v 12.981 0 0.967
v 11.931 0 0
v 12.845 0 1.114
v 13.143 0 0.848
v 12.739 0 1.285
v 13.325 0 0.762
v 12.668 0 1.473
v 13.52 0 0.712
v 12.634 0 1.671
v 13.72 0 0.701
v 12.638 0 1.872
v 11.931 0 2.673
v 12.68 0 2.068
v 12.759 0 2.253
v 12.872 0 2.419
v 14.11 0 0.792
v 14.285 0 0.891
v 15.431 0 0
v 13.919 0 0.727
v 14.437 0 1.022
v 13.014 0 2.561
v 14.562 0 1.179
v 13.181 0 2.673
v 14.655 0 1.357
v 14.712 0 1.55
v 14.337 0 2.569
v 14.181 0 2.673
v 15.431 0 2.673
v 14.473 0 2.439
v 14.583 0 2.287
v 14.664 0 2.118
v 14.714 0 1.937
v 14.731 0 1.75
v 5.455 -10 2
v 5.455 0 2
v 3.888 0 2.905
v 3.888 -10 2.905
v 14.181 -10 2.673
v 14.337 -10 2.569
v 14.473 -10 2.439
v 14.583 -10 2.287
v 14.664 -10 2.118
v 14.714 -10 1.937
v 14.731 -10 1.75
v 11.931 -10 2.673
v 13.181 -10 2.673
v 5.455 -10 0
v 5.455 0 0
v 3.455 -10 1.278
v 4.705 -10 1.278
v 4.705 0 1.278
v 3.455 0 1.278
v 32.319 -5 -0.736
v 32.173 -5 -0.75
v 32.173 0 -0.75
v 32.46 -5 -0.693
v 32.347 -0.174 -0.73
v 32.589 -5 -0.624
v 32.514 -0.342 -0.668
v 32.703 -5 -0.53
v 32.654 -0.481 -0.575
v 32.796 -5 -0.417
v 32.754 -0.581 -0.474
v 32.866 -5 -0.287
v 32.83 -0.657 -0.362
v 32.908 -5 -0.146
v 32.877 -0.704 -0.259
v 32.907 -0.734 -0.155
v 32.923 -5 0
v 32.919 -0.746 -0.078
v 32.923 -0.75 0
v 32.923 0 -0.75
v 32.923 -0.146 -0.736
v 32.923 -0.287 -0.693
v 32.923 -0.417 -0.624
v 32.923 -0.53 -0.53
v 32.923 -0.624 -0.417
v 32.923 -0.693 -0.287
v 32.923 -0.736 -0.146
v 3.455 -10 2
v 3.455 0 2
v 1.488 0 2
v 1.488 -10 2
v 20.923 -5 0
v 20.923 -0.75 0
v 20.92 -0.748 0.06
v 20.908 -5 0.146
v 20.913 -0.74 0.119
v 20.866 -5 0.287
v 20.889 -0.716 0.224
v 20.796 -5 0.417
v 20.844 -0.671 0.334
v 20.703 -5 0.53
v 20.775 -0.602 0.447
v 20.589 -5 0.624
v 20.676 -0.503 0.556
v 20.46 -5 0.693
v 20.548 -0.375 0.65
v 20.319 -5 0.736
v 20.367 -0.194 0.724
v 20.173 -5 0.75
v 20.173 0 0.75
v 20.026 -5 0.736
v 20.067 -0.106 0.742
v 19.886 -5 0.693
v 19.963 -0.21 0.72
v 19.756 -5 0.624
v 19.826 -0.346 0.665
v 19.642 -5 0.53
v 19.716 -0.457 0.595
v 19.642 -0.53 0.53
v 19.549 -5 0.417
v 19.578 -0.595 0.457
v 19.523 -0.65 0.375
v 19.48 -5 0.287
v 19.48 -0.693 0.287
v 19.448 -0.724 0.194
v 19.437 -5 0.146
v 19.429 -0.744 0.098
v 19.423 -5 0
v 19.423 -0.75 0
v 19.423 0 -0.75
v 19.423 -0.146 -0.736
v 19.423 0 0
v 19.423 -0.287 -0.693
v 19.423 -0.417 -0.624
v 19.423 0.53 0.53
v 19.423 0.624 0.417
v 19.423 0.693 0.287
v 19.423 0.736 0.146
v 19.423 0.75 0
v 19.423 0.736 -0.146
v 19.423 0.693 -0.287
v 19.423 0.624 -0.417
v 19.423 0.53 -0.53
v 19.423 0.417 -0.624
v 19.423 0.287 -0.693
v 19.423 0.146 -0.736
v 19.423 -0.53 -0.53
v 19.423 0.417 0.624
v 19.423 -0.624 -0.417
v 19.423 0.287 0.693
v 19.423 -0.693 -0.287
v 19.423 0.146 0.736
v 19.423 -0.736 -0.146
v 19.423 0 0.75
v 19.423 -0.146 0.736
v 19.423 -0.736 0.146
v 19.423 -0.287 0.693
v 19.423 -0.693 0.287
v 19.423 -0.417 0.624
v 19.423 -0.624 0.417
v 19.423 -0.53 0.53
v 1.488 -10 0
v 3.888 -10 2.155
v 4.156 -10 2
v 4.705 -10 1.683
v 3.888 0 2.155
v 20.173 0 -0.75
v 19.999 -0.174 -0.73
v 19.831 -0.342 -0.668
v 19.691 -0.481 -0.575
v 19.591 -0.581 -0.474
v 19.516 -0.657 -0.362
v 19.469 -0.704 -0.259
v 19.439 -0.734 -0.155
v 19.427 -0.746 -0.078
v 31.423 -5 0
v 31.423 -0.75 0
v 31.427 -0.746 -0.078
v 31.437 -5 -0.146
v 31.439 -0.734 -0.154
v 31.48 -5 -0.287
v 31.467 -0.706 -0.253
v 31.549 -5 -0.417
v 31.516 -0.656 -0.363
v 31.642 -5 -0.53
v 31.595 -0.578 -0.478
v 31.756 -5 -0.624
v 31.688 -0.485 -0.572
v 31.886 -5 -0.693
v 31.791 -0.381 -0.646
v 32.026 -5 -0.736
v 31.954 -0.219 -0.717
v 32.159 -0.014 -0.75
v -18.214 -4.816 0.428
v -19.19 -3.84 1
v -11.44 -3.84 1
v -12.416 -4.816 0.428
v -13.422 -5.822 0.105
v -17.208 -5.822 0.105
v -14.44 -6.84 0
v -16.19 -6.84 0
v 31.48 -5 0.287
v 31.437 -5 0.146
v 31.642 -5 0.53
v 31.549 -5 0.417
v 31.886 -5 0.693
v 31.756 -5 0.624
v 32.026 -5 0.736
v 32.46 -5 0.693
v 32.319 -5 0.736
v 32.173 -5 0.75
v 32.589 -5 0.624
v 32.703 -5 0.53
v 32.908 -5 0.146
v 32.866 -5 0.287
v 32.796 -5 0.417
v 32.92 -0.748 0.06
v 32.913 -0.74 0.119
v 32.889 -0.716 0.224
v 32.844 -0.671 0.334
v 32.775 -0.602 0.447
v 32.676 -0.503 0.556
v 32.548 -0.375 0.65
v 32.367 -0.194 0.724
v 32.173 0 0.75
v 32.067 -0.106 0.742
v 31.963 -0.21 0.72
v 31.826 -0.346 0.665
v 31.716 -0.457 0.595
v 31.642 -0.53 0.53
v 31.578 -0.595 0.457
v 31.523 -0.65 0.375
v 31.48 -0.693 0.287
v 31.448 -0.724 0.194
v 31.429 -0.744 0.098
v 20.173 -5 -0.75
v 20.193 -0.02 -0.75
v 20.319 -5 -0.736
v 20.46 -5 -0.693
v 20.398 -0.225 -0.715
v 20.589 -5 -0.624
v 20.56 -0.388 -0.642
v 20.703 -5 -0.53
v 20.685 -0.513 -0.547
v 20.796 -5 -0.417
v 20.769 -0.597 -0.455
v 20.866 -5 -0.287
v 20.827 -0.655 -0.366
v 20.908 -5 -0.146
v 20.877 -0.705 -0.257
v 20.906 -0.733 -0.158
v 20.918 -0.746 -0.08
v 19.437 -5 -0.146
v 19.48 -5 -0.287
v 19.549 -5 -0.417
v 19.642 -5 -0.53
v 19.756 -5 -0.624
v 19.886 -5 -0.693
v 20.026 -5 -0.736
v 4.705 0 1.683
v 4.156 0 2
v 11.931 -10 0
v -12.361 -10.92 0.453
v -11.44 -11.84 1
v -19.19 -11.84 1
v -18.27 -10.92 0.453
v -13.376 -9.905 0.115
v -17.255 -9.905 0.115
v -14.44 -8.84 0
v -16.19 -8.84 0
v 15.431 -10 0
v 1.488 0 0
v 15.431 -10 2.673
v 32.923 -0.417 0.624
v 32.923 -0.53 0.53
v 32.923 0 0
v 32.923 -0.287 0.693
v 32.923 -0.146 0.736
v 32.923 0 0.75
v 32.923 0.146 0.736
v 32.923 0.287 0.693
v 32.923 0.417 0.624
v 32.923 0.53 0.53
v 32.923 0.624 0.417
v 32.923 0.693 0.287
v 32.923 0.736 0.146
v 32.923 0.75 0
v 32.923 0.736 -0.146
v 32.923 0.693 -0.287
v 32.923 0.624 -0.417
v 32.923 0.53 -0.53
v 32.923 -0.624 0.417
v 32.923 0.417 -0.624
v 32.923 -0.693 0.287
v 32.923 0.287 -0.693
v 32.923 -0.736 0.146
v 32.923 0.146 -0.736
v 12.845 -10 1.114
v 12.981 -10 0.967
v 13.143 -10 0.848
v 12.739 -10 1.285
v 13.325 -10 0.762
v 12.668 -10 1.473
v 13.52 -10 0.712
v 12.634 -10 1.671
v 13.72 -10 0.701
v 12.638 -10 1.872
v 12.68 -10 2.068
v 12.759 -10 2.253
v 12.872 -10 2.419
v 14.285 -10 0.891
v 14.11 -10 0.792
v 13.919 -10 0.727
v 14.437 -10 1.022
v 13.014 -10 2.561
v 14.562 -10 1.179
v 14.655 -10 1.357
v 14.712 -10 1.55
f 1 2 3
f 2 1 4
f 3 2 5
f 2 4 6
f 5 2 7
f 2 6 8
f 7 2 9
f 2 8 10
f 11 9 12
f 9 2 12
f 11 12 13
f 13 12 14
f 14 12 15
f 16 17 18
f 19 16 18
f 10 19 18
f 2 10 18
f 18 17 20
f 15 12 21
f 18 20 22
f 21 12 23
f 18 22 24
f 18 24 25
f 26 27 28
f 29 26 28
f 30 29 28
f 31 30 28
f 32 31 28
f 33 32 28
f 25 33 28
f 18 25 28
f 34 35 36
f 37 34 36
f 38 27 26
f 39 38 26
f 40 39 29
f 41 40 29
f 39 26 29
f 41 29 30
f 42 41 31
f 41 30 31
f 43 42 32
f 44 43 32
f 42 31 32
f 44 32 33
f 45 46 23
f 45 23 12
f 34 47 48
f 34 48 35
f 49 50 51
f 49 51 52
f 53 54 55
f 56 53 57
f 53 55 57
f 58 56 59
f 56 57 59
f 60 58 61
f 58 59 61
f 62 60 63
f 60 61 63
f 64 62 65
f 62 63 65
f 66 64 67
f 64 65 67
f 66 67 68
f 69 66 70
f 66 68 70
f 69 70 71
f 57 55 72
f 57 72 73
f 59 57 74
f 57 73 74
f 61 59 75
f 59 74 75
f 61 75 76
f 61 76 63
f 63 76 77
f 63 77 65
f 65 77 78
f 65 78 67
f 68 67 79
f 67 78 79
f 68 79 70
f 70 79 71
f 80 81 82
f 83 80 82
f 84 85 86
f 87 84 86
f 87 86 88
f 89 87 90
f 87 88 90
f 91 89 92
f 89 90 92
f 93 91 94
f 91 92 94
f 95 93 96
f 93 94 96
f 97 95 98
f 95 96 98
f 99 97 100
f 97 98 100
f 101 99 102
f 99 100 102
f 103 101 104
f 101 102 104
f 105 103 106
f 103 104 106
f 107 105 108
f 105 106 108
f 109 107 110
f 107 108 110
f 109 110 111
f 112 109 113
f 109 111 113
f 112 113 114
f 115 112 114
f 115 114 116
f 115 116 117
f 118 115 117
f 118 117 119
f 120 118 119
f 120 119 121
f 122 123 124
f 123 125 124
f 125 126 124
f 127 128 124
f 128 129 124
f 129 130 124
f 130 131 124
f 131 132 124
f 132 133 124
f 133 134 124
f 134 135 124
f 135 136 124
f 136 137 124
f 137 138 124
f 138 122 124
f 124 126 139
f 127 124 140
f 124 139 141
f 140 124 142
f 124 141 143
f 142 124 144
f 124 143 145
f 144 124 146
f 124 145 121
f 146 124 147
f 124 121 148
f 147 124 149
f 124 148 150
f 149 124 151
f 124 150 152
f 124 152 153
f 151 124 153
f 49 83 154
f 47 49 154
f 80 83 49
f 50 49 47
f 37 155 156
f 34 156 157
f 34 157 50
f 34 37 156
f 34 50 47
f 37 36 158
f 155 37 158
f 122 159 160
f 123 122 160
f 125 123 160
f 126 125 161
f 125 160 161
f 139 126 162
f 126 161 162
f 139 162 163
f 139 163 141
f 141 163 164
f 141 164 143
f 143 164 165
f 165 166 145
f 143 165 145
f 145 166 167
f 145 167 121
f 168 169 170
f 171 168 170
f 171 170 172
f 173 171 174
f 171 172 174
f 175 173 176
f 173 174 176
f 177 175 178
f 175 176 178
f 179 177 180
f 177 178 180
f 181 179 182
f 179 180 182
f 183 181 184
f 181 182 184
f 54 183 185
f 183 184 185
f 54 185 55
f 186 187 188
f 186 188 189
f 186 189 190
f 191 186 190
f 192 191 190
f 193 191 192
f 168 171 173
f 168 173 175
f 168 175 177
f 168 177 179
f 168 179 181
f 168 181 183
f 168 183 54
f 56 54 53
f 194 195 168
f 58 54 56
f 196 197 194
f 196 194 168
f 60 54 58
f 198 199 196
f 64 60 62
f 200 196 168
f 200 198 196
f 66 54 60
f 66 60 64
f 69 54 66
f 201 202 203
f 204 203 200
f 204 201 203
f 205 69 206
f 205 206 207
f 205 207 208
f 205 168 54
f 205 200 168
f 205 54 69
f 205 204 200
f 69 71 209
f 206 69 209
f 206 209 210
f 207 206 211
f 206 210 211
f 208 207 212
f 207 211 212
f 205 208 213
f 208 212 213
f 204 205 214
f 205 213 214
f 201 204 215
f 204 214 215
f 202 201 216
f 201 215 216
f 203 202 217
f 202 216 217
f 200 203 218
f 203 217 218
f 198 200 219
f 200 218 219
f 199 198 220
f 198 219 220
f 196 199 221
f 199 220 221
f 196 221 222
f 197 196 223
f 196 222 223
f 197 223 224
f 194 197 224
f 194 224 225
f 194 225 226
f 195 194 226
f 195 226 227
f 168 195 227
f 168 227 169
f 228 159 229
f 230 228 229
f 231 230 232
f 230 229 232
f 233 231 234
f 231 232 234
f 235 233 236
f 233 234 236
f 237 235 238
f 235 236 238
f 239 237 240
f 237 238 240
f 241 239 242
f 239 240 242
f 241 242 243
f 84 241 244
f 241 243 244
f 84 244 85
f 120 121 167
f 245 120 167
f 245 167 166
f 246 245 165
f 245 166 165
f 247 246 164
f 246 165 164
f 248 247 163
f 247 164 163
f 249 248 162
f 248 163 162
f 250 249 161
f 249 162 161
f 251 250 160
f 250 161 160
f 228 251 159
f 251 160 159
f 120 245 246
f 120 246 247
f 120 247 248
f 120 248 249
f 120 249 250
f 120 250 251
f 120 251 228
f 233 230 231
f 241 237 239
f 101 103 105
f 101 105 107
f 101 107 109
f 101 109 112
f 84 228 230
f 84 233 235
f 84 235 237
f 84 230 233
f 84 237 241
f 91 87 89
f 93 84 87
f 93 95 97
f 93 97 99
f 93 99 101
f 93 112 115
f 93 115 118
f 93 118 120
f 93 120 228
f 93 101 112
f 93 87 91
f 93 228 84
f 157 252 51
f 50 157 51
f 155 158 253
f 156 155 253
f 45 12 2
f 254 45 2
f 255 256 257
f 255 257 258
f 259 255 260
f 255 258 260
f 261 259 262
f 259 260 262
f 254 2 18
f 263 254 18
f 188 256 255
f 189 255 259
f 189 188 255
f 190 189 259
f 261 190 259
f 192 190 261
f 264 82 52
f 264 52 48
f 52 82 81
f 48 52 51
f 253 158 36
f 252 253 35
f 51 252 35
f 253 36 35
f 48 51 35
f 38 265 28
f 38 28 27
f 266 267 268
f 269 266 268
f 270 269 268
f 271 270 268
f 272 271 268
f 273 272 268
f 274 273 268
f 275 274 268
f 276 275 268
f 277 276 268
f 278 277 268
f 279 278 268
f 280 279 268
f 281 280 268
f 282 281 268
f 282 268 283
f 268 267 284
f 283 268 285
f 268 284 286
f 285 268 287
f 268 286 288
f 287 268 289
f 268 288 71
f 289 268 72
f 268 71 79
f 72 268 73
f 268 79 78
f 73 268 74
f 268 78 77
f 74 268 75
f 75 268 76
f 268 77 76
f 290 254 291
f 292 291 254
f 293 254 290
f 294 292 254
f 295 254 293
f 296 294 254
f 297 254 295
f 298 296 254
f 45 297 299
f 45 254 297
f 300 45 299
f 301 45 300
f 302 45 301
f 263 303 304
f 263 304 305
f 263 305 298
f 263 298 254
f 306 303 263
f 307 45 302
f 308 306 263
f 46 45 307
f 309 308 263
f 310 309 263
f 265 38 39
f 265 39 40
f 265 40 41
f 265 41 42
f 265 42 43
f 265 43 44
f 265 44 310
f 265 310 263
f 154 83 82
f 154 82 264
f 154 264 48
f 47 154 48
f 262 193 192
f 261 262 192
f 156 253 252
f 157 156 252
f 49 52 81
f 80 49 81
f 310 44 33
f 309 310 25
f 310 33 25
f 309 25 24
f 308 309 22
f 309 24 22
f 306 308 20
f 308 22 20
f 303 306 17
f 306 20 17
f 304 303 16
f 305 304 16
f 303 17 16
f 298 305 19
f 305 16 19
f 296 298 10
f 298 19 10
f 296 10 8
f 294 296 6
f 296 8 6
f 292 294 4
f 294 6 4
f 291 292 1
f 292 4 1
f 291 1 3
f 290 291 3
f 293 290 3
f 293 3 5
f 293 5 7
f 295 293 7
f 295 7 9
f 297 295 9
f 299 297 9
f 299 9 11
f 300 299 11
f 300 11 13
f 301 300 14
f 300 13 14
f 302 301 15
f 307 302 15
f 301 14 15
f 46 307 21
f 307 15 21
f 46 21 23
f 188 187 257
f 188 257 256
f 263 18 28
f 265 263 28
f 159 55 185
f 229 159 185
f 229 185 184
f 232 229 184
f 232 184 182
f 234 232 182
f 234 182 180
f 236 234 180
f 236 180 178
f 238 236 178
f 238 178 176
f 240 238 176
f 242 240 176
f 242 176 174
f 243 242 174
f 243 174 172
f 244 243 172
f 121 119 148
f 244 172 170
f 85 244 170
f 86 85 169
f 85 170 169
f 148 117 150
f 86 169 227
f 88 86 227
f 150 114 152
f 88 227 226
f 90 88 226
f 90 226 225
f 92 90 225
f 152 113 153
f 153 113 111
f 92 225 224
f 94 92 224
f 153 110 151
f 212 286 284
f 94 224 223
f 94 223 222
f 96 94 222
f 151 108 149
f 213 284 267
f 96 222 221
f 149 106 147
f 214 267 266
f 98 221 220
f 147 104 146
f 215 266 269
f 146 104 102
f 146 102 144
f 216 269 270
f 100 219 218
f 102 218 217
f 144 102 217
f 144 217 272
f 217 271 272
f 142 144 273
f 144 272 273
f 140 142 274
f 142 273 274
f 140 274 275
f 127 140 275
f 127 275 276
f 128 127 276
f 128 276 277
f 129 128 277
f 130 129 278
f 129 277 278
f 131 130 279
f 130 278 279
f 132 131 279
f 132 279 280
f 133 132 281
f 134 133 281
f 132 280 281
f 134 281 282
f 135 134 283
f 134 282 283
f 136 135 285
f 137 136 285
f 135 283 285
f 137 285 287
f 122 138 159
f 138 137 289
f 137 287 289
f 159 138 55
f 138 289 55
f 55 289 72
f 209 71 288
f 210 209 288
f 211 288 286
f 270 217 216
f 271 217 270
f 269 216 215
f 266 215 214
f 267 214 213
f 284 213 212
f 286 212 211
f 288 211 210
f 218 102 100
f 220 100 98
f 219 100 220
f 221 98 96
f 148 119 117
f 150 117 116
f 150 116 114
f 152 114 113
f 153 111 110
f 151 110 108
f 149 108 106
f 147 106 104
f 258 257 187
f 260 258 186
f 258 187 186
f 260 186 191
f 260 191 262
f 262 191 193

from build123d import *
from build123d import SkipClean  # not in build123d's __all__

# Parameters (mm, degrees)
F1_DEPTH    = 10
F2_W        = 7.7500019912
F2_H        = 8
F3_DEPTH    = 1
F4_T1_DEPTH = 22.7500019912
F4_T3_DEPTH = 23
F6_DEPTH    = 10
F8_DEPTH    = 5


# Not quite as in the source:
# - a fillet or chamfer that OpenCascade refuses, or shapes differently, is made with other operations: its cross-section is extruded or revolved along the edge and cut away or added


with BuildPart() as f1:
    # F0 (on Front) → F1 (new body)
    with BuildSketch(Plane.XZ):
        Polygon((3.4554570526, 2), (1.4884697545, 2), (1.4884697545, 0), (5.4554570526, 0), (5.4554570526, 2), (3.8884697545, 2.9047005384), (3.8884697545, 2.1547005384), (4.1564189469, 2), (4.7054570526, 1.6830127019), (4.7054570526, 1.2783121635), (3.8884697545, 1.2783121635), (3.4554570526, 1.2783121635), align=None)
    extrude(amount=F1_DEPTH)


with BuildPart() as f3:
    # F2 (on Top) → F3 (new body)
    with BuildSketch(Plane.XY):
        with Locations((-15.3153333813, -7.8402892686)):
            Rectangle(F2_W, F2_H)
    extrude(amount=F3_DEPTH)

    # F4: fillet of radius 5 on 4 edges, made by hand

    # F4_s2 → F4_t1 (cut)
    with BuildSketch(Plane.YZ.offset(-26.6903343769)):
        with BuildLine():
            ThreePointArc((-3.8402892686, 1), (-5.2591504386, 0.2565835097), (-6.8402892686, 0))
            Line((-6.8402892686, 0), (-6.8402892686, -0.1))
            Line((-6.8402892686, -0.1), (-3.8402892686, -0.1))
            Line((-3.8402892686, -0.1), (-3.7402892686, 0))
            ThreePointArc((-3.7402892686, 0), (-3.7402892686, 0.5), (-3.7802892686, 0.92))
            Line((-3.7802892686, 0.92), (-3.8402892686, 1))
        make_face()
        with BuildLine():
            ThreePointArc((-11.8402892686, 1), (-10.4214280987, 0.2565835097), (-8.8402892686, 0))
            Line((-8.8402892686, 0), (-8.8402892686, -0.1))
            Line((-8.8402892686, -0.1), (-11.8402892686, -0.1))
            Line((-11.8402892686, -0.1), (-11.9402892686, 0))
            ThreePointArc((-11.9402892686, 0), (-11.9402892686, 0.5), (-11.9002892686, 0.92))
            Line((-11.9002892686, 0.92), (-11.8402892686, 1))
        make_face()
    extrude(amount=F4_T1_DEPTH, mode=Mode.SUBTRACT)

    # F4_s4 → F4_t3 (cut)
    with BuildSketch(Plane.XZ.offset(-3.6597107314)):
        with BuildLine():
            ThreePointArc((-19.1903343769, 1), (-17.771473207, 0.2565835097), (-16.1903343769, 0))
            Line((-16.1903343769, 0), (-16.1903343769, -0.1))
            Line((-16.1903343769, -0.1), (-19.1903343769, -0.1))
            Line((-19.1903343769, -0.1), (-19.2903343769, 0))
            ThreePointArc((-19.2903343769, 0), (-19.2903343769, 0.5), (-19.2503343769, 0.92))
            Line((-19.2503343769, 0.92), (-19.1903343769, 1))
        make_face()
        with BuildLine():
            ThreePointArc((-11.4403323857, 1), (-12.8591935556, 0.2565835097), (-14.4403323857, 0))
            Line((-14.4403323857, 0), (-14.4403323857, -0.1))
            Line((-14.4403323857, -0.1), (-11.4403323857, -0.1))
            Line((-11.4403323857, -0.1), (-11.3403323857, 0))
            ThreePointArc((-11.3403323857, 0), (-11.3403323857, 0.5), (-11.3803323857, 0.92))
            Line((-11.3803323857, 0.92), (-11.4403323857, 1))
        make_face()
    extrude(amount=F4_T3_DEPTH, mode=Mode.SUBTRACT)


with BuildPart() as f6:
    # F5 (on Front) → F6 (new body)
    with BuildSketch(Plane.XZ):
        with BuildLine():
            Line((13.1807962247, 2.6733092656), (11.9307962247, 2.6733092656))
            Line((11.9307962247, 2.6733092656), (11.9307962247, 0))
            Line((11.9307962247, 0), (15.4307962247, 0))
            Line((15.4307962247, 0), (15.4307962247, 2.6733092656))
            Line((15.4307962247, 2.6733092656), (14.1807962247, 2.6733092656))
            ThreePointArc((14.1807962247, 2.6733092656), (14.5828771524, 2.2873546315), (14.7307962247, 1.75))
            ThreePointArc((14.7307962247, 1.75), (13.1434415932, 0.8479190724), (13.1807962247, 2.6733092656))
        make_face()
    extrude(amount=F6_DEPTH)


with BuildPart() as f8:
    # F7 (on Front) → F8 (new body)
    with BuildSketch(Plane.XZ):
        with BuildLine():
            ThreePointArc((20.1727531818, -0.75), (20.7030832677, -0.5303300859), (20.9227531818, 0))
            Line((20.9227531818, 0), (19.4227531818, 0))
            ThreePointArc((19.4227531818, 0), (19.6424230959, -0.5303300859), (20.1727531818, -0.75))
        make_face()
        with BuildLine():
            Line((19.4227531818, 0), (20.9227531818, 0))
            ThreePointArc((20.9227531818, 0), (20.1727531818, 0.75), (19.4227531818, 0))
        make_face()
    extrude(amount=F8_DEPTH)



with BuildPart() as f8b:
    # F7 (on Front) → F8, piece 2 (new body)
    with BuildSketch(Plane.XZ):
        with BuildLine():
            ThreePointArc((32.1727531818, -0.75), (32.7030832677, -0.5303300859), (32.9227531818, 0))
            Line((32.9227531818, 0), (31.4227531818, 0))
            ThreePointArc((31.4227531818, 0), (31.6424230959, -0.5303300859), (32.1727531818, -0.75))
        make_face()
        with BuildLine():
            Line((31.4227531818, 0), (32.9227531818, 0))
            ThreePointArc((32.9227531818, 0), (32.1727531818, 0.75), (31.4227531818, 0))
        make_face()
    extrude(amount=F8_DEPTH)


with BuildPart() as f8_1:
    add(f8.part, clean=False)

    with SkipClean():  # cleaning this boolean's faces spoils the solid; the shape is the same uncleaned
        add(f8b.part)  # F9 merges F8b
    # F7 (on Front) → F9 (revolve)
    with BuildSketch(Plane.XZ):
        with BuildLine():
            Line((32.9227531818, -0.75), (32.9227531818, 0))
            ThreePointArc((32.9227531818, 0), (32.7030832677, -0.5303300859), (32.1727531818, -0.75))
            Line((32.1727531818, -0.75), (32.9227531818, -0.75))
        make_face()
        with BuildLine():
            ThreePointArc((32.1727531818, -0.75), (32.7030832677, -0.5303300859), (32.9227531818, 0))
            Line((32.9227531818, 0), (31.4227531818, 0))
            ThreePointArc((31.4227531818, 0), (31.6424230959, -0.5303300859), (32.1727531818, -0.75))
        make_face()
        with BuildLine():
            ThreePointArc((32.1727531818, -0.75), (31.6424230959, -0.5303300859), (31.4227531818, 0))
            Line((31.4227531818, 0), (20.9227531818, 0))
            ThreePointArc((20.9227531818, 0), (20.7030832677, -0.5303300859), (20.1727531818, -0.75))
            Line((20.1727531818, -0.75), (32.1727531818, -0.75))
        make_face()
        with BuildLine():
            ThreePointArc((20.1727531818, -0.75), (20.7030832677, -0.5303300859), (20.9227531818, 0))
            Line((20.9227531818, 0), (19.4227531818, 0))
            ThreePointArc((19.4227531818, 0), (19.6424230959, -0.5303300859), (20.1727531818, -0.75))
        make_face()
        with BuildLine():
            Line((19.4227531818, -0.75), (20.1727531818, -0.75))
            ThreePointArc((20.1727531818, -0.75), (19.6424230959, -0.5303300859), (19.4227531818, 0))
            Line((19.4227531818, 0), (19.4227531818, -0.75))
        make_face()
    with SkipClean():  # cleaning this boolean's faces spoils the solid; the shape is the same uncleaned
        revolve(axis=Axis((26.1727531818, 0, 0), (-1, 0, 0)))


solid = Compound([f1.part, f3.part, f6.part, f8_1.part])
